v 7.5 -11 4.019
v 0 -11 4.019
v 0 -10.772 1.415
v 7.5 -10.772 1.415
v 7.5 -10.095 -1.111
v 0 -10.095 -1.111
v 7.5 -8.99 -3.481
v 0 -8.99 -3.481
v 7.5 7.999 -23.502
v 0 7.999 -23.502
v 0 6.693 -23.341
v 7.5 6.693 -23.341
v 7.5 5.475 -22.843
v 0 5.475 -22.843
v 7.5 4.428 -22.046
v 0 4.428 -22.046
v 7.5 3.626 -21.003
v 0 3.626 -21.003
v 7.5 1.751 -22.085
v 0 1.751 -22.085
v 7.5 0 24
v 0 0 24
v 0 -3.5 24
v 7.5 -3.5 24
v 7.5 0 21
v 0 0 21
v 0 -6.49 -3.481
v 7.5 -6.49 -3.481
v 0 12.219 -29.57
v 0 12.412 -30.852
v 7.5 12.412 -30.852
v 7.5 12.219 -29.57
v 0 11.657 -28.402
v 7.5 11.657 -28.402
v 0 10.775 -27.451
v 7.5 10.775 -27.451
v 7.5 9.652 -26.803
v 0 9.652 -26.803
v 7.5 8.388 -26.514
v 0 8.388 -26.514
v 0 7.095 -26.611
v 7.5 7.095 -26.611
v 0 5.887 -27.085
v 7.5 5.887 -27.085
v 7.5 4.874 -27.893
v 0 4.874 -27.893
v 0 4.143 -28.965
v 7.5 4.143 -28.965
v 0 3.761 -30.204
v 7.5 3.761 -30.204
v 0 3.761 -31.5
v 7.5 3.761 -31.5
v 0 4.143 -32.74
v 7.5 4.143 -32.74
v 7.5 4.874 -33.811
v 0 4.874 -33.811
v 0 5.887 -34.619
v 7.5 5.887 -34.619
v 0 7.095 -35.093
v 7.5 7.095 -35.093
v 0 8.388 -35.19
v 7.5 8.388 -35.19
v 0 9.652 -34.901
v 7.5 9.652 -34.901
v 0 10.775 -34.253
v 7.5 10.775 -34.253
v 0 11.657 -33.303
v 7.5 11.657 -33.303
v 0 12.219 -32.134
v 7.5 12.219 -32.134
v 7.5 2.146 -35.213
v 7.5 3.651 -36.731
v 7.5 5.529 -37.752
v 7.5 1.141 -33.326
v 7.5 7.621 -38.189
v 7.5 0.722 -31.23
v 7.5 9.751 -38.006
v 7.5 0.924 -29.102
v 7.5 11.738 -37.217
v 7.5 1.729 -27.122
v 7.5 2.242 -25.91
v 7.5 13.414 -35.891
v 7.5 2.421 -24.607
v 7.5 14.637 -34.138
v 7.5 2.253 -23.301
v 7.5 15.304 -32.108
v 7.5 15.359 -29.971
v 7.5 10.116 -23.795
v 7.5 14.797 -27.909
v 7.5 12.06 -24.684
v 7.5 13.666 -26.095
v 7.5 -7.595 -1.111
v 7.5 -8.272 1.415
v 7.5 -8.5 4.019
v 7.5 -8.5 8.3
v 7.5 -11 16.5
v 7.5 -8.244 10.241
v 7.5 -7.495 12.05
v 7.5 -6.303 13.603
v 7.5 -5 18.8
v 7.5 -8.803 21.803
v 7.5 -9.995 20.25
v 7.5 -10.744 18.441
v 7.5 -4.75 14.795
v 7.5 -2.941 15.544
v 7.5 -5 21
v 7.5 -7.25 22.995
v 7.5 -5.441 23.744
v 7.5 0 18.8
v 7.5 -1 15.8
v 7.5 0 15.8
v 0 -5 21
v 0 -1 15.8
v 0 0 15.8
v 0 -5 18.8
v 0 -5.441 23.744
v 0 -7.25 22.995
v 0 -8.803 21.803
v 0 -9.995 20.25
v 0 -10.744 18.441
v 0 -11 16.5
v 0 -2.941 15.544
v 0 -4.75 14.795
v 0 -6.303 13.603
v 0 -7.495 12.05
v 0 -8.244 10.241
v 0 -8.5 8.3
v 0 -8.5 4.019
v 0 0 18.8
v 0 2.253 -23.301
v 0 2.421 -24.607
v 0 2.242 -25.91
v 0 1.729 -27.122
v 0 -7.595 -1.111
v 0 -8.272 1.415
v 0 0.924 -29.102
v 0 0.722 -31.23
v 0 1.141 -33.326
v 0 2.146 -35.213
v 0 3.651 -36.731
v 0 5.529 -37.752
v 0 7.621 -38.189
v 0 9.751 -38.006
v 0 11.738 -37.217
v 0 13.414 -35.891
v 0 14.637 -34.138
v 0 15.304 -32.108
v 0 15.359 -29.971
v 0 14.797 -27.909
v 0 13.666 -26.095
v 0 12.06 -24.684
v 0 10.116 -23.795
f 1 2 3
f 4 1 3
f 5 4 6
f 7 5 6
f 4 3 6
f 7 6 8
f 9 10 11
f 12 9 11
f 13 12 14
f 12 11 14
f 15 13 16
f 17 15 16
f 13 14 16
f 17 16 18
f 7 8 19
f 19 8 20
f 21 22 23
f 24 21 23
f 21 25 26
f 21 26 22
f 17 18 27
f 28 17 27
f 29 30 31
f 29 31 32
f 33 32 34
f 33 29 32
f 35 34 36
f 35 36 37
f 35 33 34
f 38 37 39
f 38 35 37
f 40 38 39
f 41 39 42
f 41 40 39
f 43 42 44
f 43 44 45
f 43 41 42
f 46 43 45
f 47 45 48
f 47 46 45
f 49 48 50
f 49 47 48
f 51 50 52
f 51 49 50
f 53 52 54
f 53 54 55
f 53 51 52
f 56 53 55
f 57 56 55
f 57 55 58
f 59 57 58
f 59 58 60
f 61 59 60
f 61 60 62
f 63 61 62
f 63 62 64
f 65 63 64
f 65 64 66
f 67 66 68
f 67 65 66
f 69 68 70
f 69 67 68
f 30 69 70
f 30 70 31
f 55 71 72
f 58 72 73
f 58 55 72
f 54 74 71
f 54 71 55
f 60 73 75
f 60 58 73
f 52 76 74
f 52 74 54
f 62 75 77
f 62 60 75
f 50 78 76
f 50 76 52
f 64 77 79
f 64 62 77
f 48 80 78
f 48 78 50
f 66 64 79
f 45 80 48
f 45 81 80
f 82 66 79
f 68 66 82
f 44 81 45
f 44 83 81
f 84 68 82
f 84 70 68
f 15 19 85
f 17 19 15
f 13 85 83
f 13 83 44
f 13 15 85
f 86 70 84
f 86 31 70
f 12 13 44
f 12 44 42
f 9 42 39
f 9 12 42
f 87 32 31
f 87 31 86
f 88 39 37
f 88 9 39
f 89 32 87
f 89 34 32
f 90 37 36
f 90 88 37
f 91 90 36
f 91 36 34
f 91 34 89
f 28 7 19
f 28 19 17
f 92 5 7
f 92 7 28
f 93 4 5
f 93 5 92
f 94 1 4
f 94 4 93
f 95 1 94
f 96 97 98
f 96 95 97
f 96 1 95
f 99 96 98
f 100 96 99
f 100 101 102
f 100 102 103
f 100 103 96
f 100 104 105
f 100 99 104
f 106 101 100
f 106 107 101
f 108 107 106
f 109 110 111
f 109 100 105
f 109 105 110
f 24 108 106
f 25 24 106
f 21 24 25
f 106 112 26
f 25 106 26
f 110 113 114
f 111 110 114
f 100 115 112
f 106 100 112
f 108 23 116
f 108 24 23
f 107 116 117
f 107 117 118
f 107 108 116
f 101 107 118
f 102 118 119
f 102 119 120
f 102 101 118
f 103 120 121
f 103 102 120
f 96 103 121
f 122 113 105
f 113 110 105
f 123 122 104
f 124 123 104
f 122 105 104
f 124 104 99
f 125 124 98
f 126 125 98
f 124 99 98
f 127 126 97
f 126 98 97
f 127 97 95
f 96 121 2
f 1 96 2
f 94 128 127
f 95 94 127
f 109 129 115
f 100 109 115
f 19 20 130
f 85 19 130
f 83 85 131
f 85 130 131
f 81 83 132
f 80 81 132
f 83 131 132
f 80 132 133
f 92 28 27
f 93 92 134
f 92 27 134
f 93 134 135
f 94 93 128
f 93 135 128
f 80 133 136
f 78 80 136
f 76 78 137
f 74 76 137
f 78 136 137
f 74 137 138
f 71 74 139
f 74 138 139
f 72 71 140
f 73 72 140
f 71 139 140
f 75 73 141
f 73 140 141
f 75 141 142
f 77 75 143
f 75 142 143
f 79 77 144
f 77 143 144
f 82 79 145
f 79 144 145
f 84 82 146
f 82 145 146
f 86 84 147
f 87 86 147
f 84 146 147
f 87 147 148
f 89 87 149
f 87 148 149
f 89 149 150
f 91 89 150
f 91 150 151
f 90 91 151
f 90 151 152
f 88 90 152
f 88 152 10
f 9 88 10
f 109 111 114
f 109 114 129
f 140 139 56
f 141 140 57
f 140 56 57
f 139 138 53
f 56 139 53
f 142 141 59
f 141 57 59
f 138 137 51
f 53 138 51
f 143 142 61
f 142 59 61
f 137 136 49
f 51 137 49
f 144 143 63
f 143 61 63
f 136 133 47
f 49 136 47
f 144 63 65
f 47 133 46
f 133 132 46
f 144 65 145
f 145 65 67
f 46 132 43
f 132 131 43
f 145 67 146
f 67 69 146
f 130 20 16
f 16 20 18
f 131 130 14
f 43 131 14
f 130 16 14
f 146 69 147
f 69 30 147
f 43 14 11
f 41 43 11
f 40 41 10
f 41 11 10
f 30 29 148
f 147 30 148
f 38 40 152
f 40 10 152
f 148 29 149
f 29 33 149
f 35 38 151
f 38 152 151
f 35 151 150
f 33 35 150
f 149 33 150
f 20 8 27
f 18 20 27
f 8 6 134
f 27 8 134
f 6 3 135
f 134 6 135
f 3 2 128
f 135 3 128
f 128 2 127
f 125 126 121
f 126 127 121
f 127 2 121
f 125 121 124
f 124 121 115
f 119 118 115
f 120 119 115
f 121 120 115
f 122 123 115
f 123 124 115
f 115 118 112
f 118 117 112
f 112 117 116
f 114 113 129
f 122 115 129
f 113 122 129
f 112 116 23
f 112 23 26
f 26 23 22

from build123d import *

# Parameters (mm, degrees)
F0_R     = 4.35
F1_DEPTH = 7.5
F2_R     = 7.5


with BuildPart() as f1:
    # F0 (on Right) → F1 (new body)
    with BuildSketch(Plane.YZ):
        with BuildLine():
            Line((0, 15.8), (0, 18.8))
            Line((0, 18.8), (-5, 18.8))
            Line((-5, 18.8), (-5, 21))
            Line((-5, 21), (0, 21))
            Line((0, 21), (0, 24))
            Line((0, 24), (-11, 24))
            Line((-11, 24), (-11, 4.019238))
            ThreePointArc((-11, 4.019238), (-10.488887, 0.136952), (-8.990381, -3.480762))
            Line((-8.990381, -3.480762), (1.750865, -22.085146))
            ThreePointArc((1.750865, -22.085146), (2.420692, -24.606707), (1.729144, -27.122397))
            ThreePointArc((1.729144, -27.122397), (11.7375, -37.217442), (7.999113, -23.502428))
            ThreePointArc((7.999113, -23.502428), (5.474687, -22.843481), (3.625865, -21.002614))
            Line((3.625865, -21.002614), (-6.490381, -3.480762))
            ThreePointArc((-6.490381, -3.480762), (-7.988887, 0.136952), (-8.5, 4.019238))
            Line((-8.5, 4.019238), (-8.5, 15.8))
            Line((-8.5, 15.8), (0, 15.8))
        make_face()
        with Locations((8.0625, -30.852155)):
            Circle(F0_R, mode=Mode.SUBTRACT)
    extrude(amount=F1_DEPTH)

    # F2
    f2_edges = [f1.edges().sort_by_distance(p)[0] for p in [
        (3.75, -11, 24),
        (3.75, -8.5, 15.8),
    ]]
    fillet(f2_edges, radius=F2_R)


solid = f1.part
